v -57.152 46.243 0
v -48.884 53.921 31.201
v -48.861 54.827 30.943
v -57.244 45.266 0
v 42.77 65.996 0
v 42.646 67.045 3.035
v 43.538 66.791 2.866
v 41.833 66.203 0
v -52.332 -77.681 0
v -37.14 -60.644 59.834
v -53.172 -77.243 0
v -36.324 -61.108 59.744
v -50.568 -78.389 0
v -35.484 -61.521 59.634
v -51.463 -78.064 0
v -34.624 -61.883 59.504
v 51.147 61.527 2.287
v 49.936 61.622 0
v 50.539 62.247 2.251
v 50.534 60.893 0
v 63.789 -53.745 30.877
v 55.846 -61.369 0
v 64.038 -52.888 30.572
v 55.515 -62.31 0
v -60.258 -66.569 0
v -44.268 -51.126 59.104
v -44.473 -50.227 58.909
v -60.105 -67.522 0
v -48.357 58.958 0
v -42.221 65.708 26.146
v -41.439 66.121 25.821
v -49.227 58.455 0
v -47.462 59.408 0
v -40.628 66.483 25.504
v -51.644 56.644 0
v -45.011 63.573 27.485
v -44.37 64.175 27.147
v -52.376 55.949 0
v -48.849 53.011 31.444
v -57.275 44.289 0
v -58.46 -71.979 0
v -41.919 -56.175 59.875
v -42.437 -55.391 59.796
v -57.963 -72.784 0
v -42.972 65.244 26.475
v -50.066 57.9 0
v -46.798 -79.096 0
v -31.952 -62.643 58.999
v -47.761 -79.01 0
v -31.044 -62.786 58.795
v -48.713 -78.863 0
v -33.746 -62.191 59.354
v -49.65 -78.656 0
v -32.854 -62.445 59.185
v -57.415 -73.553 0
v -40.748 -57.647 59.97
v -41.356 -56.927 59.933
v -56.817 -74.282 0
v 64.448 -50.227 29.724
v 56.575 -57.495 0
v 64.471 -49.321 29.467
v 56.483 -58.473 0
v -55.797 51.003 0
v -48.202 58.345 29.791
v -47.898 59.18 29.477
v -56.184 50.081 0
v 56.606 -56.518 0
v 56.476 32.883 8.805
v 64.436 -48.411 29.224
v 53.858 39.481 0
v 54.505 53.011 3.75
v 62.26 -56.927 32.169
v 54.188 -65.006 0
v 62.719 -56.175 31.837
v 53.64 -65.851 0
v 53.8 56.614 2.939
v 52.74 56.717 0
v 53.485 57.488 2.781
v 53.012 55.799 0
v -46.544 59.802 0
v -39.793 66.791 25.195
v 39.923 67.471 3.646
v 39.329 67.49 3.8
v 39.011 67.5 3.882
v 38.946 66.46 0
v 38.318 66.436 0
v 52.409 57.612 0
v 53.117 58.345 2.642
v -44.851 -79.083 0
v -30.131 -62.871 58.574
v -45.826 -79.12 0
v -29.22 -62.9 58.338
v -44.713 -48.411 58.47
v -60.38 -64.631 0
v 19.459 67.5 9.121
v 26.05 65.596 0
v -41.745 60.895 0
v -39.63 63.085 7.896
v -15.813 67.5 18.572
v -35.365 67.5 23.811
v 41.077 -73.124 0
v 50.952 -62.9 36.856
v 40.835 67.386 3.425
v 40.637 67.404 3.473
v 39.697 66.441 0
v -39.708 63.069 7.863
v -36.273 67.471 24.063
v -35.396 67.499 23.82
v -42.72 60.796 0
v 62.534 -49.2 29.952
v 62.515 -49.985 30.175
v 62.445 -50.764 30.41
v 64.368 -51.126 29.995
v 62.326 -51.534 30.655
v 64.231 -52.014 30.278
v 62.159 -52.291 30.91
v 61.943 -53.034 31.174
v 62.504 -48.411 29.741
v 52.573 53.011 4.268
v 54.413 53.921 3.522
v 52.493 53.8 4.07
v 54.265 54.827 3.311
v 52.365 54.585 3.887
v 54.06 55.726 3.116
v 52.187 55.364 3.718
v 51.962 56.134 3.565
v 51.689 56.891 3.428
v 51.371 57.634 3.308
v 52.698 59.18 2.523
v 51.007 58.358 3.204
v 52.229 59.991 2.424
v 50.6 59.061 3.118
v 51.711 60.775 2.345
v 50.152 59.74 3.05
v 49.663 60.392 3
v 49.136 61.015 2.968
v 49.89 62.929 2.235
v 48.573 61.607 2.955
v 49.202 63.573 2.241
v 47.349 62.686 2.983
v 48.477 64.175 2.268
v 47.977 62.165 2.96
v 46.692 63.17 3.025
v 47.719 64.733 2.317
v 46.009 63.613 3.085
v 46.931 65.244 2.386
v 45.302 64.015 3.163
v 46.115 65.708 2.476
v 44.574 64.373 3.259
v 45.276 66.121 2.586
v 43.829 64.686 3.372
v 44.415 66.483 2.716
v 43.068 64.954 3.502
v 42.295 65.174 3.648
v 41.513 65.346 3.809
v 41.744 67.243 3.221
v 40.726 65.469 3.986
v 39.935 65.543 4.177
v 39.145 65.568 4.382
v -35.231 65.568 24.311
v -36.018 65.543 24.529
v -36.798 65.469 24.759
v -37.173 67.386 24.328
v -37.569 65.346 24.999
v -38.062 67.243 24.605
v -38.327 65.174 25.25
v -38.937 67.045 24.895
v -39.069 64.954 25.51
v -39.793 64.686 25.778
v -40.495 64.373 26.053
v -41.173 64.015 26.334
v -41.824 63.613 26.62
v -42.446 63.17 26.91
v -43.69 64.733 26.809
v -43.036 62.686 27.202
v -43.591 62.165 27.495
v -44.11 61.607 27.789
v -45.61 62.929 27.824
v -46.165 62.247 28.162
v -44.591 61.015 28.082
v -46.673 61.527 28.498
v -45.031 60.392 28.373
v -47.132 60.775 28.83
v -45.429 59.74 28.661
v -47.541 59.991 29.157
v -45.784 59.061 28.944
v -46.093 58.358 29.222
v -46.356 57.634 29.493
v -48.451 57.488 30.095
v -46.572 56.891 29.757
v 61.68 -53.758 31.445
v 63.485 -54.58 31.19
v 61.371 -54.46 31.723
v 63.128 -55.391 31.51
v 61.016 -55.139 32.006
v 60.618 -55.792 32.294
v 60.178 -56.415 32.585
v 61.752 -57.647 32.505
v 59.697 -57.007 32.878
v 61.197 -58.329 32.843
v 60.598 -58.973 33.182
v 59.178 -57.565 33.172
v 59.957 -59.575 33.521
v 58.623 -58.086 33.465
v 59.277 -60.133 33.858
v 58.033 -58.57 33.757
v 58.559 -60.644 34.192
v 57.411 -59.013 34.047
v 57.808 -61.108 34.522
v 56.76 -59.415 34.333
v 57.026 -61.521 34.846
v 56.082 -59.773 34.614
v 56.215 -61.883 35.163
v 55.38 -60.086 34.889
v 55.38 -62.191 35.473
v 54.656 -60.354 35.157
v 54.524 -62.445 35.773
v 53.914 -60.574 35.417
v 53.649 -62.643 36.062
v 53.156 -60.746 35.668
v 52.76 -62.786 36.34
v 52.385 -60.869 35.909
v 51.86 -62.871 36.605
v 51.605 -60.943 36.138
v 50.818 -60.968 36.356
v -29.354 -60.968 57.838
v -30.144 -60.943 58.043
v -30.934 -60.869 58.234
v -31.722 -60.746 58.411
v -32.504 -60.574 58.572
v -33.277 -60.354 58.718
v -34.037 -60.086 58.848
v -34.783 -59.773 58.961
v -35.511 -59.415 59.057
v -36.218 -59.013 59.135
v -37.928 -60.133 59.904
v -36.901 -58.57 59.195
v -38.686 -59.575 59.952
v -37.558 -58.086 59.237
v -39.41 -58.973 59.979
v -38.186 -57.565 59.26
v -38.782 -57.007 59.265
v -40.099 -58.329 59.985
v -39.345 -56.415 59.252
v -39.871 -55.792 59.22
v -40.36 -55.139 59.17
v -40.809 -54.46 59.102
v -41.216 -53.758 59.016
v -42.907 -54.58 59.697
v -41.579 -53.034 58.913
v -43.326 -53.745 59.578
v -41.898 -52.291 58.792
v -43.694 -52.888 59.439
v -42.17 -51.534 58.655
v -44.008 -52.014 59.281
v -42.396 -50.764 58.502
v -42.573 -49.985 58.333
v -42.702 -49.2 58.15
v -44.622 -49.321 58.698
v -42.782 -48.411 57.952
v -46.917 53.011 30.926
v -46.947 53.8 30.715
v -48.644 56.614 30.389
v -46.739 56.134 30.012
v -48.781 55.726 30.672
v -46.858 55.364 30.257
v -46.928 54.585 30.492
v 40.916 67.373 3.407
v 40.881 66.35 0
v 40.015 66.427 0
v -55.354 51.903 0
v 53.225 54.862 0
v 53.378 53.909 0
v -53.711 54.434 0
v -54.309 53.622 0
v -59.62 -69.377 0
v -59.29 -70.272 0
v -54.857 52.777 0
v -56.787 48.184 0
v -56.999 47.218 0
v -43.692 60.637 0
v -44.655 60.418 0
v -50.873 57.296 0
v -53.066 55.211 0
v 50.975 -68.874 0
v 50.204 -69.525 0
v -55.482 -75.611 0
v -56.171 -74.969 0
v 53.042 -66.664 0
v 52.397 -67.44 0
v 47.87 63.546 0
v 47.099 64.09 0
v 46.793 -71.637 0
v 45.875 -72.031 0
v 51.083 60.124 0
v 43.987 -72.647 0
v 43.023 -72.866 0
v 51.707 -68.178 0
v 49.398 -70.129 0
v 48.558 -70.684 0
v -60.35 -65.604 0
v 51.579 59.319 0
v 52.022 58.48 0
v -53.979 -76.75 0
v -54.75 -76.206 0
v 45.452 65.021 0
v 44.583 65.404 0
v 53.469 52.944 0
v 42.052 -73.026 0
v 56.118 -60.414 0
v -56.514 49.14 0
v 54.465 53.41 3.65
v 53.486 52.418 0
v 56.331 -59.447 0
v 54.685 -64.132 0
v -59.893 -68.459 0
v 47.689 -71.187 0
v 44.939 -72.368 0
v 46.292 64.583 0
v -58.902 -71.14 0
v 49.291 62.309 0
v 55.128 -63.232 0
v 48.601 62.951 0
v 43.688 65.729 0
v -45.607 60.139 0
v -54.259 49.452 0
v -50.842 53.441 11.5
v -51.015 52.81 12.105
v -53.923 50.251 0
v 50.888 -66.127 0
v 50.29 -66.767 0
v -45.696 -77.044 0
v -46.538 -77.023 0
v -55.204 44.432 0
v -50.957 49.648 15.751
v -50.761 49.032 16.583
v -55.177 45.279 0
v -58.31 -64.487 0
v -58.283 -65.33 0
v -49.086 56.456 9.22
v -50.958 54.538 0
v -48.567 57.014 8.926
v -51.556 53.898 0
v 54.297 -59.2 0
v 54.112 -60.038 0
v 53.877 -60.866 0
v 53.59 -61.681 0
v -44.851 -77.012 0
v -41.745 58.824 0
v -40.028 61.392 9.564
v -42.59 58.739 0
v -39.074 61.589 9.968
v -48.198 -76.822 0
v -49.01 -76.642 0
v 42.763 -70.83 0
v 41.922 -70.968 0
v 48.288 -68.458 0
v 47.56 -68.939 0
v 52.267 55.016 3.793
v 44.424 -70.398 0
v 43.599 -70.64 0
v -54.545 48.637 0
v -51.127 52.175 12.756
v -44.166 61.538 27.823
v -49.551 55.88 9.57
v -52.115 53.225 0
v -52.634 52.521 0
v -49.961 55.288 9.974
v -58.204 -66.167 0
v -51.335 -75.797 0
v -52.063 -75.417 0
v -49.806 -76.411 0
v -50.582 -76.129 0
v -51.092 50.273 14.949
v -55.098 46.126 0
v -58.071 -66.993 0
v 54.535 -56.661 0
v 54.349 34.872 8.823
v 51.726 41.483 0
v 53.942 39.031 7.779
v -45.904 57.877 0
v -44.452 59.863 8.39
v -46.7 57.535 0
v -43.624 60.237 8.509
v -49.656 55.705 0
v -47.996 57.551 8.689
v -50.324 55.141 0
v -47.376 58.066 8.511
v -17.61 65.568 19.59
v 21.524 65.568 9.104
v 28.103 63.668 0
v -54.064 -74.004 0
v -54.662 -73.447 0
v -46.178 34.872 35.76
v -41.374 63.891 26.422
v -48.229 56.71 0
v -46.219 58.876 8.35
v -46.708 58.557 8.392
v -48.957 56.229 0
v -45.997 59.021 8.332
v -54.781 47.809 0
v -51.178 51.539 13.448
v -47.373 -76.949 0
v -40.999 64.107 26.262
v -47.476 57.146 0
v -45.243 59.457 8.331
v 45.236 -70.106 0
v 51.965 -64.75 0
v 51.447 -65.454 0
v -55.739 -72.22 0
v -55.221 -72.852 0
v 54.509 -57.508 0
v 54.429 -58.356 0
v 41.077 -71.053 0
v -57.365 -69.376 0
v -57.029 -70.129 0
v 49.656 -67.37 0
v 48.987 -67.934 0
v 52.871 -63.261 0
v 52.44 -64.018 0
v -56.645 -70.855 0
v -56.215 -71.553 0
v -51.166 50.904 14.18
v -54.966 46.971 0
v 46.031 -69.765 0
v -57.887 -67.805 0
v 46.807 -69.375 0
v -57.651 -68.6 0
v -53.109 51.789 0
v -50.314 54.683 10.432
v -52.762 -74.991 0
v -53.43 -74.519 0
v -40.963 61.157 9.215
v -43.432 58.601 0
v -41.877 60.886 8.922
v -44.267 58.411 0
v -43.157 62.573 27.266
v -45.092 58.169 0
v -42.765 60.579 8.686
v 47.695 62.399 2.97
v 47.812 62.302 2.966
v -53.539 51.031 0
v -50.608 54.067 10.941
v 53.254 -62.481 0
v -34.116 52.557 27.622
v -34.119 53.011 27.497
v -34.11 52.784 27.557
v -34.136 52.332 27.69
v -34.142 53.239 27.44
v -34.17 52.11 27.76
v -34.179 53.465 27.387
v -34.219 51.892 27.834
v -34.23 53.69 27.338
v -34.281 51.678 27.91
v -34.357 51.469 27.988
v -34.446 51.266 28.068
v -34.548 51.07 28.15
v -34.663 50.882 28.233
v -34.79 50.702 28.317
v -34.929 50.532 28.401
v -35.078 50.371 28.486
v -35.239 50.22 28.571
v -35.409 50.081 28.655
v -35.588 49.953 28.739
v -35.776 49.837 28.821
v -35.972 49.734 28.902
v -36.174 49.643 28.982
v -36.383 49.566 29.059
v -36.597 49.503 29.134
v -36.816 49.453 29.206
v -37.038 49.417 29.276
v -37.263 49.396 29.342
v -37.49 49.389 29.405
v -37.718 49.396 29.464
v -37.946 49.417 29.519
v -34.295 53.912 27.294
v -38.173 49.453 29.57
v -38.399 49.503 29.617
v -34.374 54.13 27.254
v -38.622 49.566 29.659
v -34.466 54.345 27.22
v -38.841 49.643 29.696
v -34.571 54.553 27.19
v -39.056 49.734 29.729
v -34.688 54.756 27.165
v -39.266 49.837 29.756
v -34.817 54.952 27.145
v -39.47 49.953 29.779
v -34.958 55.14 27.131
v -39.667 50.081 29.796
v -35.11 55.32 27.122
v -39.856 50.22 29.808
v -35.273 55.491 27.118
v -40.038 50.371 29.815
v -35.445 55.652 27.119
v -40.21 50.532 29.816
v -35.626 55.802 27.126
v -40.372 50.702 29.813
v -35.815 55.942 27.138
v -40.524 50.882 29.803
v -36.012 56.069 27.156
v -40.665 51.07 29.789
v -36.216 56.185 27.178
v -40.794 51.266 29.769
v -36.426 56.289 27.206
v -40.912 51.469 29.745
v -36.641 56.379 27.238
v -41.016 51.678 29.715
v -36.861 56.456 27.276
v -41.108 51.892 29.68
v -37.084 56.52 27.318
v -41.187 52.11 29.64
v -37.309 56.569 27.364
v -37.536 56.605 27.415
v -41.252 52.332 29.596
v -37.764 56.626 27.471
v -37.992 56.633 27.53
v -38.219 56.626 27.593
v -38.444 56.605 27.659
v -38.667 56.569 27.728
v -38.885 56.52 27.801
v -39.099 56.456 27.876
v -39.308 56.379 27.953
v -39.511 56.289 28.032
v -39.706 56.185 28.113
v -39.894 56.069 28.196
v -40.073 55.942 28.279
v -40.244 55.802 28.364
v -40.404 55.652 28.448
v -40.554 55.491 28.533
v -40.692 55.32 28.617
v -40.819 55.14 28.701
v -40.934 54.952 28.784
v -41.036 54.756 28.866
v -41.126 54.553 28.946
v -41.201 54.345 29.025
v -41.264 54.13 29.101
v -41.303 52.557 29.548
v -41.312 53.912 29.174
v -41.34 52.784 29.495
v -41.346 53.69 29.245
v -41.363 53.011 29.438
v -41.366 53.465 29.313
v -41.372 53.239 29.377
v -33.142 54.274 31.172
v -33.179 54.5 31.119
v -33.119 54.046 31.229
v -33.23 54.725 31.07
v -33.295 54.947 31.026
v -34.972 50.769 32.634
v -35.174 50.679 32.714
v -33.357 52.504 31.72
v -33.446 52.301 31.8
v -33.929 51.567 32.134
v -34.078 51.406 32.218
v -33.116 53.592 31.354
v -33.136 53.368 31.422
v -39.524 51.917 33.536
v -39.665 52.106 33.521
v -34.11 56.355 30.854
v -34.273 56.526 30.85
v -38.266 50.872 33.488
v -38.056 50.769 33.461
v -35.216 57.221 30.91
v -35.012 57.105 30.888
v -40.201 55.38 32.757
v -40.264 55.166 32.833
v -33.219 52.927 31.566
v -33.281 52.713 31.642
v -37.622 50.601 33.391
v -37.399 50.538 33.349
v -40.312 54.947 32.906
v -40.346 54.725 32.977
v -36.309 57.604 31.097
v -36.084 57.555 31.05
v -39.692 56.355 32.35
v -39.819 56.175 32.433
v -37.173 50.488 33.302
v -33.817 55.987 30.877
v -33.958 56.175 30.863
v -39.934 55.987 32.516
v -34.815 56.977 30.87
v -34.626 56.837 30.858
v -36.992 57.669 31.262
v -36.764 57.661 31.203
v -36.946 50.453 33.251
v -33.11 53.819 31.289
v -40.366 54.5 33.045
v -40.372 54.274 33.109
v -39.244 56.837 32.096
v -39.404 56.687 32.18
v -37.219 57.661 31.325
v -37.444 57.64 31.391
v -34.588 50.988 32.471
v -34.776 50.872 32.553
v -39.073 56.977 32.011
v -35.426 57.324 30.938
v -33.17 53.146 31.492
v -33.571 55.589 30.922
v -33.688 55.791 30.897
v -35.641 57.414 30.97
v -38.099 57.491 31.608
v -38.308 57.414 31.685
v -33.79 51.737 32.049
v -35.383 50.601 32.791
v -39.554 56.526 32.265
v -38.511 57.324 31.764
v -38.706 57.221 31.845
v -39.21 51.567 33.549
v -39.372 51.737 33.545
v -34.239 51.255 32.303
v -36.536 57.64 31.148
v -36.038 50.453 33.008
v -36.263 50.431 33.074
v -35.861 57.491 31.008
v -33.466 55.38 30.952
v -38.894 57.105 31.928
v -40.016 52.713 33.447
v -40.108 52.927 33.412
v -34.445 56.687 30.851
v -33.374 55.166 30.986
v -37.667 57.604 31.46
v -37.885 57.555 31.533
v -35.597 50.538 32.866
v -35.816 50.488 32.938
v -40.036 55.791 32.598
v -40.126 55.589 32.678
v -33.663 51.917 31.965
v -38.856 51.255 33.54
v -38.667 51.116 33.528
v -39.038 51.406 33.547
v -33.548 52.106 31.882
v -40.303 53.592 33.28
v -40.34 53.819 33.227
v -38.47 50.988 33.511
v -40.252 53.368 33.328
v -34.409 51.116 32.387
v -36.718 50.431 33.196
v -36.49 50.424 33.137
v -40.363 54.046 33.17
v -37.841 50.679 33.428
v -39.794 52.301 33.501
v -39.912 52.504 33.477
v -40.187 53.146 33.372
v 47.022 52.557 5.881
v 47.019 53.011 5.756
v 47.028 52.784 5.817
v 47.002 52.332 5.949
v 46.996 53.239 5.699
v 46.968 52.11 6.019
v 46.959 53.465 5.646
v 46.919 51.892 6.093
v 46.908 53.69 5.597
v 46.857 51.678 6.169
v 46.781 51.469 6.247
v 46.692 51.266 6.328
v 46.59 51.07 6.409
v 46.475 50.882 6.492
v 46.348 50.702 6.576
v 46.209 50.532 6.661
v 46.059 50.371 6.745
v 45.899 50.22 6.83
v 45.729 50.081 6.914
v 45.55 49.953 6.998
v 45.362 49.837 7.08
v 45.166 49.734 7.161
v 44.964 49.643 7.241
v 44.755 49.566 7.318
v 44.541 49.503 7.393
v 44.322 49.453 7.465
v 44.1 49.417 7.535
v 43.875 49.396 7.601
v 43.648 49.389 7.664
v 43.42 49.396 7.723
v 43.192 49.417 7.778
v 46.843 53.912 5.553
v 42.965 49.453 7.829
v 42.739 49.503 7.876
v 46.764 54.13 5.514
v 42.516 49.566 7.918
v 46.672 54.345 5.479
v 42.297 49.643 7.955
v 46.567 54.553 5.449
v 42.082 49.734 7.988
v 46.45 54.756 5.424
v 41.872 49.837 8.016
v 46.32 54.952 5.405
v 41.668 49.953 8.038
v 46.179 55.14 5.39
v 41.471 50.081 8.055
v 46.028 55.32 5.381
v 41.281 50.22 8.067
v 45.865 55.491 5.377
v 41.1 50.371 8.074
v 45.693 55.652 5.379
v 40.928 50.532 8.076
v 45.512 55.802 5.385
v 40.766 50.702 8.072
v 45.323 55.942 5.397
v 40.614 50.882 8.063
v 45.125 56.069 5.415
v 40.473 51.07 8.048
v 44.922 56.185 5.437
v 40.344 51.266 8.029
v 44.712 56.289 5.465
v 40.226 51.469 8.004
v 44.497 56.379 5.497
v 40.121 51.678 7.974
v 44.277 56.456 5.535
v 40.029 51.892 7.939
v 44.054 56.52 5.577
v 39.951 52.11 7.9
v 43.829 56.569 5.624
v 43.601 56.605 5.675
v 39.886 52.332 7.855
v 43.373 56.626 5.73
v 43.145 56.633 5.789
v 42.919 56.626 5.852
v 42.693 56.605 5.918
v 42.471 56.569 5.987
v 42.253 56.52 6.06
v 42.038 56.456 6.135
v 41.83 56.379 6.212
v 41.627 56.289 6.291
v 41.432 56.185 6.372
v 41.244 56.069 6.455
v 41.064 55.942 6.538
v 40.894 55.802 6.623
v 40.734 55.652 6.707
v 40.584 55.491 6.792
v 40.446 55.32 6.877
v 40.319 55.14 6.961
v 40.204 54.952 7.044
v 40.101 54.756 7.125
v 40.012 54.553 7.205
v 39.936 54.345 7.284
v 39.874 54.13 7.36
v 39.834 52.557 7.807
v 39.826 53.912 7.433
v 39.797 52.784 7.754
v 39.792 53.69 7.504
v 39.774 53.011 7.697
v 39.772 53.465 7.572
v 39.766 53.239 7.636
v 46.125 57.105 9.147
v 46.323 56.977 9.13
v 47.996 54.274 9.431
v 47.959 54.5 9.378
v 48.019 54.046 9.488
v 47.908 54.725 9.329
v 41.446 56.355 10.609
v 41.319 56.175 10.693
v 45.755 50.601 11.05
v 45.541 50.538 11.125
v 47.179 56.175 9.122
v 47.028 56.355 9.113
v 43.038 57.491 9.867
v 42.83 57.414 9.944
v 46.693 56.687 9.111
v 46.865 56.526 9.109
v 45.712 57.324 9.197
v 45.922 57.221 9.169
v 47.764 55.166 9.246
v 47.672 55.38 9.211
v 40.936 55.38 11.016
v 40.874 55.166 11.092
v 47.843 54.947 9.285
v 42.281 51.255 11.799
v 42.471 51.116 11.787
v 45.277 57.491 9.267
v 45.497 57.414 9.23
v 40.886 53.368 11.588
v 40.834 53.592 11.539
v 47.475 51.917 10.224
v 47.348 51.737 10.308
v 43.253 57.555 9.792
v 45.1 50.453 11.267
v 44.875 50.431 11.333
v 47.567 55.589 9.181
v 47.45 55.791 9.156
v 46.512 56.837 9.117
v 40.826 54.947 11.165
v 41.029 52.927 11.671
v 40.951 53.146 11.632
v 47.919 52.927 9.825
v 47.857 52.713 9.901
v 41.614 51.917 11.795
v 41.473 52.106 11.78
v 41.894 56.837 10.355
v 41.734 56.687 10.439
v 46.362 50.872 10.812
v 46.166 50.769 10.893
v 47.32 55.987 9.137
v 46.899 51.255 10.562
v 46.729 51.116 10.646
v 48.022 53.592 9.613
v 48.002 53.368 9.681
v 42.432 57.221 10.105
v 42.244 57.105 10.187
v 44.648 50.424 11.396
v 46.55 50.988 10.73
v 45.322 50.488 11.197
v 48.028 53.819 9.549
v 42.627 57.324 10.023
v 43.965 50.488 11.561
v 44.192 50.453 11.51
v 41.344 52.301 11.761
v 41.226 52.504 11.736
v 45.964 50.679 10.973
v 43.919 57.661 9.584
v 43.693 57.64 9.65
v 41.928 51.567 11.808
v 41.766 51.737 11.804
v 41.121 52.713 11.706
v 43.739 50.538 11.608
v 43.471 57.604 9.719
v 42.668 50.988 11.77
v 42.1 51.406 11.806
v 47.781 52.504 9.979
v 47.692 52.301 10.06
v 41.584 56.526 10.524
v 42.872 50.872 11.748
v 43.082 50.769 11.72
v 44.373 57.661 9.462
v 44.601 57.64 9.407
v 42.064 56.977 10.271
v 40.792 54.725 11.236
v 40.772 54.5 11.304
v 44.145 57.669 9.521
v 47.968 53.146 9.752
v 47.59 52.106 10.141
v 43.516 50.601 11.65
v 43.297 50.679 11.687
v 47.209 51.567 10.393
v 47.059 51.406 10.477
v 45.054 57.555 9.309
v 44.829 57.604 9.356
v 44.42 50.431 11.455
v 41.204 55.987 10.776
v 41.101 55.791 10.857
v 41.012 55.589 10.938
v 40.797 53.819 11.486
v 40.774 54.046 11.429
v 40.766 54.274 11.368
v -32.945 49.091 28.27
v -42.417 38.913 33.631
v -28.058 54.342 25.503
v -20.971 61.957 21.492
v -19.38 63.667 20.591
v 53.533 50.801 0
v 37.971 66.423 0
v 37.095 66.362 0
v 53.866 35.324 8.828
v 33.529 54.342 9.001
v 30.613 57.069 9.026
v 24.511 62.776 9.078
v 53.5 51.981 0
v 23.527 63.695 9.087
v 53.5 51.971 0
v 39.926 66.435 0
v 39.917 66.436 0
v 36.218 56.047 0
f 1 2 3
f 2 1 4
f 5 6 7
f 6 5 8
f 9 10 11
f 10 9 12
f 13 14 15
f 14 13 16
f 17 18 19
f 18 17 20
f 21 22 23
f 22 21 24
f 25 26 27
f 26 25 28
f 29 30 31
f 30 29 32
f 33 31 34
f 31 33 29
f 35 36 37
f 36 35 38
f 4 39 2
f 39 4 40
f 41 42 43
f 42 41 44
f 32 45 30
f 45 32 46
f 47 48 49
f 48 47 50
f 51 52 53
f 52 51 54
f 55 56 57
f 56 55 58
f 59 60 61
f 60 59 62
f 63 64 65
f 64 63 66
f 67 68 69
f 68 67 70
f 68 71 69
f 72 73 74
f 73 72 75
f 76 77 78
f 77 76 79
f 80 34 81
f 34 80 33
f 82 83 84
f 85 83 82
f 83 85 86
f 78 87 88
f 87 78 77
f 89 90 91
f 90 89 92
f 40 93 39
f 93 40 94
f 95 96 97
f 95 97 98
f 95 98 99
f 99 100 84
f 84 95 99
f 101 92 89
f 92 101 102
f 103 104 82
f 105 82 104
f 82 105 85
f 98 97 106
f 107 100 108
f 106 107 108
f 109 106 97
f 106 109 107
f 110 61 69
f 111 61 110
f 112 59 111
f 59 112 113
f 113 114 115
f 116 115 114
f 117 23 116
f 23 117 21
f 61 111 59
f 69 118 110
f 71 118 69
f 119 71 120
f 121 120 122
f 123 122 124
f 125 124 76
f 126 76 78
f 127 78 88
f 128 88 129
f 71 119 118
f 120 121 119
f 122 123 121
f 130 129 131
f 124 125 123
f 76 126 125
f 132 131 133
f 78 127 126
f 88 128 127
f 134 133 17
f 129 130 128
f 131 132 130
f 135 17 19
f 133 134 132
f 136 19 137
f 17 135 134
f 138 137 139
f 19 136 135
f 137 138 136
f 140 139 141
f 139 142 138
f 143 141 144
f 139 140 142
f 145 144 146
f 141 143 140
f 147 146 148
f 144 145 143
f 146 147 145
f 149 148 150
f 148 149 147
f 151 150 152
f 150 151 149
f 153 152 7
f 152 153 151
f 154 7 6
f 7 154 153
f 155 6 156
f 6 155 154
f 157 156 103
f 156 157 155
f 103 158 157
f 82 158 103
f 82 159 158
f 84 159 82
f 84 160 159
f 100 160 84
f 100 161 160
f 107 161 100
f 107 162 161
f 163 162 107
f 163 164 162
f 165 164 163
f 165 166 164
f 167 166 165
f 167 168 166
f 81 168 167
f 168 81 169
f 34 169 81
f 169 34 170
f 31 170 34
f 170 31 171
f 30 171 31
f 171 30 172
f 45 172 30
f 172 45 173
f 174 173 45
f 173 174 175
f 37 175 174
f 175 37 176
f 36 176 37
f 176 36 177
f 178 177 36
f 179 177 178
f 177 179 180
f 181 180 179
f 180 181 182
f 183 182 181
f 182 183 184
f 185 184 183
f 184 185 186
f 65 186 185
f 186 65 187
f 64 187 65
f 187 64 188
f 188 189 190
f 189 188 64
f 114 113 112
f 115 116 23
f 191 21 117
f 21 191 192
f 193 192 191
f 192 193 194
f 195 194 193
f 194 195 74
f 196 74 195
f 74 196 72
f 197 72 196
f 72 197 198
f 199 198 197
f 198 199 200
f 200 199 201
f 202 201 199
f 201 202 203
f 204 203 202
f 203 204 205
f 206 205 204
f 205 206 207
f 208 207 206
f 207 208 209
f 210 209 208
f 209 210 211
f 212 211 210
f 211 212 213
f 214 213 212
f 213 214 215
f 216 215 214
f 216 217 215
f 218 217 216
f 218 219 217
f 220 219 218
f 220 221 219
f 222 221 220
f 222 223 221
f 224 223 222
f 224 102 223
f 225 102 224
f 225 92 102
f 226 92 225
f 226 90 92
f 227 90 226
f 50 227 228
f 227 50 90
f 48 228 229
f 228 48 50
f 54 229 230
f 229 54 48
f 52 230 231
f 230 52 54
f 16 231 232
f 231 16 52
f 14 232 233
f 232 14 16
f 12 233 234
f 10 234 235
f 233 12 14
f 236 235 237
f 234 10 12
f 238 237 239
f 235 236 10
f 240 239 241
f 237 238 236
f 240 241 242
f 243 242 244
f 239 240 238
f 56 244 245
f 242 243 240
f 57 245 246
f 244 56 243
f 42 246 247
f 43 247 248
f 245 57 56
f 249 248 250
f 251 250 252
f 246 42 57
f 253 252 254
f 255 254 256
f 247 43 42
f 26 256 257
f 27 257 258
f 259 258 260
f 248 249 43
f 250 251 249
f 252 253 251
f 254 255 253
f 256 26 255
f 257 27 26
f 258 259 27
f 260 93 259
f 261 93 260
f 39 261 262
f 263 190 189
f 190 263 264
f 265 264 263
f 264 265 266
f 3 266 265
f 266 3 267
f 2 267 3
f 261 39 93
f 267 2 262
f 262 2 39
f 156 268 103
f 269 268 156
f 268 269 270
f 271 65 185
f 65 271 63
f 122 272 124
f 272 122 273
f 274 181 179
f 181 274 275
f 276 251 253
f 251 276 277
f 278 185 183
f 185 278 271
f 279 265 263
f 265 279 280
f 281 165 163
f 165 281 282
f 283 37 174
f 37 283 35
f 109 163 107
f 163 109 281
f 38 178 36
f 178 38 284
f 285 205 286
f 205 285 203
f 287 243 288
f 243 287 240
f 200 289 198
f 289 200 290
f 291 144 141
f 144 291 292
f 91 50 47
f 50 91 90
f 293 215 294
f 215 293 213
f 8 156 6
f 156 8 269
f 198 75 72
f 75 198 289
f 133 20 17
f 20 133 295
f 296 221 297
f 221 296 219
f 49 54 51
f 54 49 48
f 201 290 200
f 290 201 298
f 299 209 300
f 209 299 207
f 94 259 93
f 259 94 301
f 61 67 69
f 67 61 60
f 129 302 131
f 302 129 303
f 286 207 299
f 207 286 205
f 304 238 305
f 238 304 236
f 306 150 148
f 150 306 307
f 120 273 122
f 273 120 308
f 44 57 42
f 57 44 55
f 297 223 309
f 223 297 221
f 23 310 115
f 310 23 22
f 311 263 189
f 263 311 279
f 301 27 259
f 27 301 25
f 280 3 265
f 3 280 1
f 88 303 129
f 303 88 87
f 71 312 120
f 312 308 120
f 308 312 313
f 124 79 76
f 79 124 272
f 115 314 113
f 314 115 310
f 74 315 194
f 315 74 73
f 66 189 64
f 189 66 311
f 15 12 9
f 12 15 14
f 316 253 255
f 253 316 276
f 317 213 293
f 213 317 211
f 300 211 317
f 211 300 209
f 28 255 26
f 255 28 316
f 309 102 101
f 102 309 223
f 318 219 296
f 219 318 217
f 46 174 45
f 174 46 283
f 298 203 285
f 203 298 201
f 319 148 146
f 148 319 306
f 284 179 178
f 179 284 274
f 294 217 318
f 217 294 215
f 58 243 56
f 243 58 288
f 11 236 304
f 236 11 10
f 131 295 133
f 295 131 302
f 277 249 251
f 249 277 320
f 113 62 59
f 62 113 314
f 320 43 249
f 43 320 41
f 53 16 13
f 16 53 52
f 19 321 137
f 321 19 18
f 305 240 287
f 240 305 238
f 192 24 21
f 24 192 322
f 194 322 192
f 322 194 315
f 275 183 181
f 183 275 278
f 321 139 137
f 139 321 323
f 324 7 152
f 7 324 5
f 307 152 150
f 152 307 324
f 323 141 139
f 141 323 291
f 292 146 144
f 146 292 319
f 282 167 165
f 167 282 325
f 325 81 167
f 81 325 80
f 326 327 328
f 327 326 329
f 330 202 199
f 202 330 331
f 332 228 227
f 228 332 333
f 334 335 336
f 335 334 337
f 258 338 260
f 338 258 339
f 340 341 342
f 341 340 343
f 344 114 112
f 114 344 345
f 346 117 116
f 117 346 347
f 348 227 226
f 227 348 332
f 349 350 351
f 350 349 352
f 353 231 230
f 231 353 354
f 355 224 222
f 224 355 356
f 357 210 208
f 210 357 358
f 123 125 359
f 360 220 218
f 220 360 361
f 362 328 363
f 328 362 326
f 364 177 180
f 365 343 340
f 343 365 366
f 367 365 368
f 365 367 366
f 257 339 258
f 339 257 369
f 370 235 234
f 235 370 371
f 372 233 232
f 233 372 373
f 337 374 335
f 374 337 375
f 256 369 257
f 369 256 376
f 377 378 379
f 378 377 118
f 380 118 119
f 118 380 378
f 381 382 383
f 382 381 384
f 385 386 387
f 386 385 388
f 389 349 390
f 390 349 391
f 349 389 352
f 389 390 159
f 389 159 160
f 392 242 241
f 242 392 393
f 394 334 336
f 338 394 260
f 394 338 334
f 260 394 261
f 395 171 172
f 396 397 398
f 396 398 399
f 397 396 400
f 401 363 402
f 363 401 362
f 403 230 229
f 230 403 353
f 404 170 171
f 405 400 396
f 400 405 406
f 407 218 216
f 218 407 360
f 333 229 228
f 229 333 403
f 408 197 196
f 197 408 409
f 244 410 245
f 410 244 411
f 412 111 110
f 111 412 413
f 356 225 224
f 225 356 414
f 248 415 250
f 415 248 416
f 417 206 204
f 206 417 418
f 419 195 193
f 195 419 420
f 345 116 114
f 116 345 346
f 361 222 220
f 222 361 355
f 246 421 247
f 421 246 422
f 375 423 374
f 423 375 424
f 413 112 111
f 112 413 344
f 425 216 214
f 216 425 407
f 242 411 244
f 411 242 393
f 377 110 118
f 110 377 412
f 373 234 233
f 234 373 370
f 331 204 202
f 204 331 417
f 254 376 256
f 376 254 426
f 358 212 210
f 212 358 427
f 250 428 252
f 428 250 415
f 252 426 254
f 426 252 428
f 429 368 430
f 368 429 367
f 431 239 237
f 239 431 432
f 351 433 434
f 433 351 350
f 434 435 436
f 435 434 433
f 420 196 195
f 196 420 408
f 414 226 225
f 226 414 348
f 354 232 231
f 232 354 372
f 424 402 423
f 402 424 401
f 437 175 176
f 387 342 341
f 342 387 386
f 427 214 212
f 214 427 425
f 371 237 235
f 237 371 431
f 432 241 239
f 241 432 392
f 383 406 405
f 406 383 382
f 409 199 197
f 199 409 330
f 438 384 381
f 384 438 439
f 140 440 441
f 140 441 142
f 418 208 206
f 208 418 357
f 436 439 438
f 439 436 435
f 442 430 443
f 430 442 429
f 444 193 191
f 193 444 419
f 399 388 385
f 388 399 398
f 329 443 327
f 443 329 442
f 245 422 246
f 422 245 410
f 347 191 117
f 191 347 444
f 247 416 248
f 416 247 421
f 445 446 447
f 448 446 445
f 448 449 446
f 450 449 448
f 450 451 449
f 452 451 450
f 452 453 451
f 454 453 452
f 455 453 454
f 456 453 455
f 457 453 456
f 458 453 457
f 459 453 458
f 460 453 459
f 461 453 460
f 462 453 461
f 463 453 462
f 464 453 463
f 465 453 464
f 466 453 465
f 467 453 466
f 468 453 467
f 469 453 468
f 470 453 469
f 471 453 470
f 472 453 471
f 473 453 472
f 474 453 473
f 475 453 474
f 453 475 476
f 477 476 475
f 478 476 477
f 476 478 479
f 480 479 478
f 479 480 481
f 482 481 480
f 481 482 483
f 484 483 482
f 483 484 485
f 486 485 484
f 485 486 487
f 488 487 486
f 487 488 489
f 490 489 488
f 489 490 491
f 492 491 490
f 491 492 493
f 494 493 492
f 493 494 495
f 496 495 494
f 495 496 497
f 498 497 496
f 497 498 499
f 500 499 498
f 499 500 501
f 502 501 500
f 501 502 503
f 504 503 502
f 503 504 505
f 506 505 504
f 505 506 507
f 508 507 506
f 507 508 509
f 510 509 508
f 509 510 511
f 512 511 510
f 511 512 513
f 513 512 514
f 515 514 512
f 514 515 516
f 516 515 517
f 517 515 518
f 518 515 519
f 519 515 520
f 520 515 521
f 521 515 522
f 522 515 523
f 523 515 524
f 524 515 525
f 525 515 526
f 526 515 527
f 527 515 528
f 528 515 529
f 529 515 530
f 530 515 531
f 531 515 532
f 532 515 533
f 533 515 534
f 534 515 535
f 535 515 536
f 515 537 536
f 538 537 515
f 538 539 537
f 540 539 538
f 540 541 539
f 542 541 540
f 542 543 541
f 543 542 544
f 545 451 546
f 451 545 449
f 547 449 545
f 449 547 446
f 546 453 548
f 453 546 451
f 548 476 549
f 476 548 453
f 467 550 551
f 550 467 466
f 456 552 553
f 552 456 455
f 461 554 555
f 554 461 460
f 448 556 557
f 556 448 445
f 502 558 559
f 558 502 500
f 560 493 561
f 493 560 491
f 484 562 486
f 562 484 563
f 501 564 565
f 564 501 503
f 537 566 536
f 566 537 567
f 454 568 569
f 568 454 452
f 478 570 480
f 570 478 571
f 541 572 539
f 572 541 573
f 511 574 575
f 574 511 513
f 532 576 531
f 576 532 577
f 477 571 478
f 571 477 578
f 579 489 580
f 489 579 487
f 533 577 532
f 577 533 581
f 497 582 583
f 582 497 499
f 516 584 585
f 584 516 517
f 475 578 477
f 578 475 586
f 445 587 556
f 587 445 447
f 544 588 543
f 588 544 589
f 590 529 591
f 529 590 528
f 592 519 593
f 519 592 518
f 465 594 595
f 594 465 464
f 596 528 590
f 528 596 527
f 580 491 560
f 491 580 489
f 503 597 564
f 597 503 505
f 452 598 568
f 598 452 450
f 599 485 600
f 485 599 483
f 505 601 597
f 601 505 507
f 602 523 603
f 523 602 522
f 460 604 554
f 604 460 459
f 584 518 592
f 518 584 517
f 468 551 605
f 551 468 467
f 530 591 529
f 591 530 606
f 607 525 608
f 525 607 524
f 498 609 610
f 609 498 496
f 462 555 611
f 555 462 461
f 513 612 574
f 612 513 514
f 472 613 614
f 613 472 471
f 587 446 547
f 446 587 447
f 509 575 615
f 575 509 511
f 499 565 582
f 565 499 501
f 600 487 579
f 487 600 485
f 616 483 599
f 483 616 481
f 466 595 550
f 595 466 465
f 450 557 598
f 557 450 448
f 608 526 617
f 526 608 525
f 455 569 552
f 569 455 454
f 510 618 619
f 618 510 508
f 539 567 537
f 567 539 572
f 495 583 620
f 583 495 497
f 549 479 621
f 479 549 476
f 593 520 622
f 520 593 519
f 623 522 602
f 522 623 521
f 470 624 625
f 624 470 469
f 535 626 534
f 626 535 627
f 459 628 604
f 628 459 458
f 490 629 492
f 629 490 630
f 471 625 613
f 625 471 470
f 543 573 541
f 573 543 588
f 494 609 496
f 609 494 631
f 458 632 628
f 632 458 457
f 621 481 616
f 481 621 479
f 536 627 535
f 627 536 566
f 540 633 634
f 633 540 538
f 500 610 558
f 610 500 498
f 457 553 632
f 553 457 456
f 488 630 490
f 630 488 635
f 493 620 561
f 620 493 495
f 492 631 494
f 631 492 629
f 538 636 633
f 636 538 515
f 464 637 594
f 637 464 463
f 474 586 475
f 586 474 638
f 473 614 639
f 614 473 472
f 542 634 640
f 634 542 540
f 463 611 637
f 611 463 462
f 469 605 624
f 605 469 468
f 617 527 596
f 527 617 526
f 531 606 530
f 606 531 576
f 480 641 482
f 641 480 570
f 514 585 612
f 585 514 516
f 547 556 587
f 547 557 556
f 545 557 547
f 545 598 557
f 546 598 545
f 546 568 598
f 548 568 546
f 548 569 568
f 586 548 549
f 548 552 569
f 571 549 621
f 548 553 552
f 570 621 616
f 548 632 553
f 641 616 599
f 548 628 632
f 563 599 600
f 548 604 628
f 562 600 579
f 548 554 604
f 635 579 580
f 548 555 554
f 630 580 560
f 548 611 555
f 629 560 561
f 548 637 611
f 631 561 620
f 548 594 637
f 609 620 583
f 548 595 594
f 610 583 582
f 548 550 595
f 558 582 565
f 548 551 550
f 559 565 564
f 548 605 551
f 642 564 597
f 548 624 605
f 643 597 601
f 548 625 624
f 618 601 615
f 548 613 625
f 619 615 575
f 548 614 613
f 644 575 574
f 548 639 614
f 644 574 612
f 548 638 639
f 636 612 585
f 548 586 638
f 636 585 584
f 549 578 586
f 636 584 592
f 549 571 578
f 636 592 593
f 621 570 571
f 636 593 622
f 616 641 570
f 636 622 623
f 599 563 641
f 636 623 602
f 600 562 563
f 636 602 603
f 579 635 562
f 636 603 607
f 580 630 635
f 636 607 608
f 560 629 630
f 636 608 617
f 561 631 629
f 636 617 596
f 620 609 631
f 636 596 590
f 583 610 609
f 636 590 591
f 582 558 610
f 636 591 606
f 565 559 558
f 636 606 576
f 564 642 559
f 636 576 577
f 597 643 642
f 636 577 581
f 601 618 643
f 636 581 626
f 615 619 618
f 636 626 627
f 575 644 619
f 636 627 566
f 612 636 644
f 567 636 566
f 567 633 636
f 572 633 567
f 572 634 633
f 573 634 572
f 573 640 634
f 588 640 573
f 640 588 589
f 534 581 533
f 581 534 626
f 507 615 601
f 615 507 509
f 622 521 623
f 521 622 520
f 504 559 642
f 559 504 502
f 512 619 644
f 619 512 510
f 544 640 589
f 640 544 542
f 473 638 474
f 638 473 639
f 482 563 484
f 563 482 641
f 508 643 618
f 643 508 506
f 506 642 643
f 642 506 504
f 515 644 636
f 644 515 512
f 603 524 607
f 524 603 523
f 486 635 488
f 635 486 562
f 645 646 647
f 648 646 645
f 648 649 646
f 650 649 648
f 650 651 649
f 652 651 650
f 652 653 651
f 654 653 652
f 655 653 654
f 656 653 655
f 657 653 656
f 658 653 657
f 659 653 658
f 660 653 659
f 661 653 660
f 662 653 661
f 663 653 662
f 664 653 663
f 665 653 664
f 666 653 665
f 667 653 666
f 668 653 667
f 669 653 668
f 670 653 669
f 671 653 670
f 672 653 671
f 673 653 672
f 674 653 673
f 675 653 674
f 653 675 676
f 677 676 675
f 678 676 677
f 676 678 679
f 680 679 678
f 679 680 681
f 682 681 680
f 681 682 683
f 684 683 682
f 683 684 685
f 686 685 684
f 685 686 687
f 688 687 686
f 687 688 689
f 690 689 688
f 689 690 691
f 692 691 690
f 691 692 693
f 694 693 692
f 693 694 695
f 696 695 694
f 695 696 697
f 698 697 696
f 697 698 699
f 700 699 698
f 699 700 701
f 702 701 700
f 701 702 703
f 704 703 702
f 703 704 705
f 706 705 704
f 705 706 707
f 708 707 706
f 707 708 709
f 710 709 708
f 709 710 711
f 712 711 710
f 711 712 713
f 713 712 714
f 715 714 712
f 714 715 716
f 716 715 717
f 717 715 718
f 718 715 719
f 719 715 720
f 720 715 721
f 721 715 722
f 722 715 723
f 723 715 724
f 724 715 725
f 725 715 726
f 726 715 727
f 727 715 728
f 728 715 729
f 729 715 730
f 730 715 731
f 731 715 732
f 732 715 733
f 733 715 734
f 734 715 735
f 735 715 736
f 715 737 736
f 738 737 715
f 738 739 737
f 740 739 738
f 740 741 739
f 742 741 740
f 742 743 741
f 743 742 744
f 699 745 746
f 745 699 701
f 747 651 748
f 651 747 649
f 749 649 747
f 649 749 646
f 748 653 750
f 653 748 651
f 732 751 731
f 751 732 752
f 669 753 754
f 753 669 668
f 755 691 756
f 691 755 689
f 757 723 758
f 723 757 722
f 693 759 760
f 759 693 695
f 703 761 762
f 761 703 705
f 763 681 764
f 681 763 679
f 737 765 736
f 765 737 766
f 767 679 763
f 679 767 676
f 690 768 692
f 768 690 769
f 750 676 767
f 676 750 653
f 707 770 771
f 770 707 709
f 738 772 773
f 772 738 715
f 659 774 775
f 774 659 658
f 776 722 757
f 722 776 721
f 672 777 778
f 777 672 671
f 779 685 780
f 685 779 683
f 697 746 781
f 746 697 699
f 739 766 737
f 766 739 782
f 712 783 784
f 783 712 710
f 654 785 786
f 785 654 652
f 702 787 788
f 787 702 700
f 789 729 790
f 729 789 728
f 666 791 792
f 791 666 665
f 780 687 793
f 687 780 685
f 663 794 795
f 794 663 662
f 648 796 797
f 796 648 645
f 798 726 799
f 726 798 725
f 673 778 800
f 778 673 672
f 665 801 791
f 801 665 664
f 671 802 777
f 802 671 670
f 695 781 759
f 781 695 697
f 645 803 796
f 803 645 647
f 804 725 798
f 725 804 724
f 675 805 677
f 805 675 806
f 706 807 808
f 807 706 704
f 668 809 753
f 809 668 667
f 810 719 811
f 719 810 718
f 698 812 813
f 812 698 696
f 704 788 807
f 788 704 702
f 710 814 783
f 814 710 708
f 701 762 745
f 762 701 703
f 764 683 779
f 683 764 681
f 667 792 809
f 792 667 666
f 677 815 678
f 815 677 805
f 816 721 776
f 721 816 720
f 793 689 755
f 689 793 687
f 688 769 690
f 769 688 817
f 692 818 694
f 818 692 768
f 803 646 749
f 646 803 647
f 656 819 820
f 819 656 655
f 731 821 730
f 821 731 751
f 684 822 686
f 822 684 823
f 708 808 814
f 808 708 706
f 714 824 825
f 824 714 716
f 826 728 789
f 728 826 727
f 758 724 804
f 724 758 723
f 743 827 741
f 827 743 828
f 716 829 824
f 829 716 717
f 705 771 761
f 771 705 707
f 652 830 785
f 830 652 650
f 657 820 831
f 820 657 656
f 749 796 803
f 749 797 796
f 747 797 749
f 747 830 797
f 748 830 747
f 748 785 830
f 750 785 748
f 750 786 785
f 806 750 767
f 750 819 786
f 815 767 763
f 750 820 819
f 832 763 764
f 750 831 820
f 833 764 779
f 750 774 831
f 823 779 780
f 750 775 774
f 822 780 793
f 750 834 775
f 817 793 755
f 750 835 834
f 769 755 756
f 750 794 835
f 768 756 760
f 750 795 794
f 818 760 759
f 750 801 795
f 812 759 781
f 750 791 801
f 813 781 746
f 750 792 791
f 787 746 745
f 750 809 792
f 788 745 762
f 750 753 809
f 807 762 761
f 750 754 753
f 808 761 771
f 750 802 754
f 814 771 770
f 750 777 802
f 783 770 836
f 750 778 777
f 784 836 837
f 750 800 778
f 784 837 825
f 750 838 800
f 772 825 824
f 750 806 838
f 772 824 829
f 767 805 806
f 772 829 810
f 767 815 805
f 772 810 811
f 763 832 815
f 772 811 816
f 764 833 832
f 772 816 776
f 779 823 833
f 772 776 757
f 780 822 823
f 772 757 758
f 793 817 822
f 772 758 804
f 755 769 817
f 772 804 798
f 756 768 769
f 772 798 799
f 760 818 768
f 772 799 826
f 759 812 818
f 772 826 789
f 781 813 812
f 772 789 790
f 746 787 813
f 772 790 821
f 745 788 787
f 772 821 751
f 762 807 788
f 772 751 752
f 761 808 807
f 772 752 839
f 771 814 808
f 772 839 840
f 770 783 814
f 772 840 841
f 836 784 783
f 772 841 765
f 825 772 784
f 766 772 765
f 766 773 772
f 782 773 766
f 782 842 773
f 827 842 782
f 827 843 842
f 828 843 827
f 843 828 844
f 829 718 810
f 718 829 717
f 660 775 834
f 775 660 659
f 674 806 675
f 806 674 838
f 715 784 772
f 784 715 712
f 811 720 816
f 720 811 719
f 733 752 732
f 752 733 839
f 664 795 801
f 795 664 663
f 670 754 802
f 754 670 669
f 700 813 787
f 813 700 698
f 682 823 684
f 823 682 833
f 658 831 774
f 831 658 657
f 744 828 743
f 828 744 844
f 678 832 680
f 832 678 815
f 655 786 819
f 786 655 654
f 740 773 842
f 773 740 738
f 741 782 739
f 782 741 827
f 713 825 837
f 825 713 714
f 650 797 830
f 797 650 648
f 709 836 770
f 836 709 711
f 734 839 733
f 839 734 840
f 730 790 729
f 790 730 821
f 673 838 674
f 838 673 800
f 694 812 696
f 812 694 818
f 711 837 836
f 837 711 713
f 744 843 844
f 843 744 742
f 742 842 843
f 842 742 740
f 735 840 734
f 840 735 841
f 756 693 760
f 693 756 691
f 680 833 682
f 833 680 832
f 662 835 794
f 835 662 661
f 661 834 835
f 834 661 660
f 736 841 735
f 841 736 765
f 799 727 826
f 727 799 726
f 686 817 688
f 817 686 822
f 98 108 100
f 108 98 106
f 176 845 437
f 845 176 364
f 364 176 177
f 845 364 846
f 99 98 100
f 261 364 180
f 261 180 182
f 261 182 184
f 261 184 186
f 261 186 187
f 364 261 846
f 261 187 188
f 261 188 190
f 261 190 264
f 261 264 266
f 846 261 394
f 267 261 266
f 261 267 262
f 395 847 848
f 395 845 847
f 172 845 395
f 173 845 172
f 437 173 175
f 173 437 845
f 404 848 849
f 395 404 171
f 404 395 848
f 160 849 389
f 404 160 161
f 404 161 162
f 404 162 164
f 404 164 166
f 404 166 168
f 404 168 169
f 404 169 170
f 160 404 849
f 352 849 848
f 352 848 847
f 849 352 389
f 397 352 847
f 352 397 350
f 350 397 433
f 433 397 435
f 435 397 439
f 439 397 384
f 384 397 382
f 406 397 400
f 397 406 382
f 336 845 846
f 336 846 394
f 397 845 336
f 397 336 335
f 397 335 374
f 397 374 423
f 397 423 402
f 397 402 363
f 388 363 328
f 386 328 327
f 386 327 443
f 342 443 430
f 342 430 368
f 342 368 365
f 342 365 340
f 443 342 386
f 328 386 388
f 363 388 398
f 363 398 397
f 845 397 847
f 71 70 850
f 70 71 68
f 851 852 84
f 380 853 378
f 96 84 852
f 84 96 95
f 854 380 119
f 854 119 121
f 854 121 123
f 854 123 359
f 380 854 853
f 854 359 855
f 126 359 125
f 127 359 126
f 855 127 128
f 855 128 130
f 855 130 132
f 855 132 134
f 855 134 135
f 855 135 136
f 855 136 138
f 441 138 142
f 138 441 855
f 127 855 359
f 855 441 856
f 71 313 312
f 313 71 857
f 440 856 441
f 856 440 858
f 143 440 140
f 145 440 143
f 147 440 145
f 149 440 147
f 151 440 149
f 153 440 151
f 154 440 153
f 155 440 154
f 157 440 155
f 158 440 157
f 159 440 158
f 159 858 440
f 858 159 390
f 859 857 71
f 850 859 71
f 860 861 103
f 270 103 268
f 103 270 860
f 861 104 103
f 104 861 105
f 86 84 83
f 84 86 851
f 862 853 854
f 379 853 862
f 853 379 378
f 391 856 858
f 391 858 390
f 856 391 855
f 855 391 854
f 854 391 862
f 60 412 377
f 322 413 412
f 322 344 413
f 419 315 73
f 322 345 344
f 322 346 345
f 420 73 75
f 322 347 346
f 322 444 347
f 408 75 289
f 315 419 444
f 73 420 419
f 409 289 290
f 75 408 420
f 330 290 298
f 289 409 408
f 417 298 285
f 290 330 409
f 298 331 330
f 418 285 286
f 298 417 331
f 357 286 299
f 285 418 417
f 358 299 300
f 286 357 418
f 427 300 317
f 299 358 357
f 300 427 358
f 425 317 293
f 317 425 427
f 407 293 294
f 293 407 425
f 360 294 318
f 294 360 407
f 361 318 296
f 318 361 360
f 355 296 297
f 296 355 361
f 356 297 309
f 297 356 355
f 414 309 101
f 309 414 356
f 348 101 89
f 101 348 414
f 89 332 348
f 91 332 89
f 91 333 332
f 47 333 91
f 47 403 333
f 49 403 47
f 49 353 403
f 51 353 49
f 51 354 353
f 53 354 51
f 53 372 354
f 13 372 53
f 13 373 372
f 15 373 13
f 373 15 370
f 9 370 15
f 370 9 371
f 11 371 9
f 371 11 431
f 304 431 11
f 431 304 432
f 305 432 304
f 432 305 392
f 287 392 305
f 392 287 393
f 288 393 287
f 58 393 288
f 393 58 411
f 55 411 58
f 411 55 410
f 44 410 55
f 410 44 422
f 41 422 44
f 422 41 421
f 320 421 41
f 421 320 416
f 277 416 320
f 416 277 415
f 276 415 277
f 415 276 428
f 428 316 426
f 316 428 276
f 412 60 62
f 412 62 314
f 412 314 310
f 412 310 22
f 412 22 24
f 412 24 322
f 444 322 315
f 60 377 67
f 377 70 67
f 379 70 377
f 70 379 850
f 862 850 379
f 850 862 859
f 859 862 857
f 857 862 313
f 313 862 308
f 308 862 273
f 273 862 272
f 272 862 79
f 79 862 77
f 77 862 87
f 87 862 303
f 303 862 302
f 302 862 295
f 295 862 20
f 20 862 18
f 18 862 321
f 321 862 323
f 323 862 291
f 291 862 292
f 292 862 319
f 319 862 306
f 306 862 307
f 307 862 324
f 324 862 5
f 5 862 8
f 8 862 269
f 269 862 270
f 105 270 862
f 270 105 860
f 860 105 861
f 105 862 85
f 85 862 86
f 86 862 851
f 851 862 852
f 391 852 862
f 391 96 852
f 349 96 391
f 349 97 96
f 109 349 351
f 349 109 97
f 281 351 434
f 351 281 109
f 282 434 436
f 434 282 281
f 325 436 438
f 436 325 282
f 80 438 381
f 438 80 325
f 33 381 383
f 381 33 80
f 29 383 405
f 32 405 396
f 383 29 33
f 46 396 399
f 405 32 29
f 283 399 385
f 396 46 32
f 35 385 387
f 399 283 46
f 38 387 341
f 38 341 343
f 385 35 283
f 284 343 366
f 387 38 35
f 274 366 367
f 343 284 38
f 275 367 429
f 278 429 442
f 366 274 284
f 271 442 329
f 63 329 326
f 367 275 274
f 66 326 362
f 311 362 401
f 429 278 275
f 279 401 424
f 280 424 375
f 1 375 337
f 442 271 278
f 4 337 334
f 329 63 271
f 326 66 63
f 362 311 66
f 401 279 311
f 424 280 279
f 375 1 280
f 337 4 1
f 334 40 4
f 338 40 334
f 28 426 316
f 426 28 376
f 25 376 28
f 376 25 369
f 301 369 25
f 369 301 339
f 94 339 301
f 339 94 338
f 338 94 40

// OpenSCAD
// Params
with_wrist_rest=true;
roll_angle=-15;
pitch_angle=15;
base_height=0;
wall_thickness=2;

// Constants (may mess up model)
front_w=107;
front_hole_cc=84;
back_w=113;
platform_l=135;
platform_h=200;
corner_radius=15;

$fn = 100;

module rotate_about_pt(x, y, z, pt) {
	translate(pt)
		rotate([x, y, z])
			translate(-pt)
				children();
}

module rounded_four_square(front_width, back_width, length, height, corner_rad) {
	minkowski() {
		linear_extrude(height, center=true)
			polygon([
					// front left
					[-(front_width/2)+corner_rad, (length/2)-corner_rad],
					// front right
					[(front_width/2)-corner_rad, (length/2)-corner_rad],
					// back right
					[(back_width/2)-corner_rad, -(length/2)+corner_rad],
					// back left
					[-(back_width/2)+corner_rad, -(length/2)+corner_rad],
			]);
		cylinder(height, r=corner_rad, center=true);
	}
}

module hollow_shape() {
	difference() {
		rounded_four_square(front_w, back_w, platform_l, platform_h, corner_radius);
		translate([0, 0, -0.1])
			rounded_four_square(
				front_w-(wall_thickness*2),
				back_w-(wall_thickness*2),
				platform_l-(wall_thickness*2),
				platform_h+10,
				corner_radius-wall_thickness
			);
	}
}

module cut_box() {
	cut_box_w=1000;
	cut_box_l=1000;
	cut_box_h=1000;

	translate([0, 0, -500])
		cube([cut_box_w, cut_box_l, cut_box_h], center=true);
}

module on_top_plane() {
	rotate_about_pt(roll_angle, pitch_angle, 0, [front_w/2, platform_l/2])
		translate([0, 0, -platform_h+base_height])
			children();
}

module solid_model() {
	on_top_plane()
		rounded_four_square(front_w, back_w, platform_l, platform_h, corner_radius);
}

module model() {
	on_top_plane()
		hollow_shape();
}

module cut_pins() {
	intersection() {
		translate([0, 0, 50+platform_h])
			cube([1000, 1000, 100], center=true);

		children();
	}
}

module mount_pins() {
	cut_pins() {
		// left
		translate([-front_hole_cc/2, platform_l/2-corner_radius, 0]) {
			cylinder(platform_h+4, d=7.5);
		}
	}

	cut_pins() {
		// right
		translate([front_hole_cc/2, platform_l/2-corner_radius, 0])
			cylinder(platform_h+4, d=7.5);
	}
}

module corner_box(left=true) {
	intersection() {
		solid_model();

		on_top_plane()
			translate([left ? -front_hole_cc/2 : front_hole_cc/2, platform_l/2, platform_h+50])
				rotate([40, 0, left ? 45 : -45])
					cube([90, 90, 1000], center=true);
	}
}

difference() {
	union() {
		model();
		on_top_plane()
			mount_pins();
		corner_box(true);
		corner_box(false);
	}
	cut_box();
}
